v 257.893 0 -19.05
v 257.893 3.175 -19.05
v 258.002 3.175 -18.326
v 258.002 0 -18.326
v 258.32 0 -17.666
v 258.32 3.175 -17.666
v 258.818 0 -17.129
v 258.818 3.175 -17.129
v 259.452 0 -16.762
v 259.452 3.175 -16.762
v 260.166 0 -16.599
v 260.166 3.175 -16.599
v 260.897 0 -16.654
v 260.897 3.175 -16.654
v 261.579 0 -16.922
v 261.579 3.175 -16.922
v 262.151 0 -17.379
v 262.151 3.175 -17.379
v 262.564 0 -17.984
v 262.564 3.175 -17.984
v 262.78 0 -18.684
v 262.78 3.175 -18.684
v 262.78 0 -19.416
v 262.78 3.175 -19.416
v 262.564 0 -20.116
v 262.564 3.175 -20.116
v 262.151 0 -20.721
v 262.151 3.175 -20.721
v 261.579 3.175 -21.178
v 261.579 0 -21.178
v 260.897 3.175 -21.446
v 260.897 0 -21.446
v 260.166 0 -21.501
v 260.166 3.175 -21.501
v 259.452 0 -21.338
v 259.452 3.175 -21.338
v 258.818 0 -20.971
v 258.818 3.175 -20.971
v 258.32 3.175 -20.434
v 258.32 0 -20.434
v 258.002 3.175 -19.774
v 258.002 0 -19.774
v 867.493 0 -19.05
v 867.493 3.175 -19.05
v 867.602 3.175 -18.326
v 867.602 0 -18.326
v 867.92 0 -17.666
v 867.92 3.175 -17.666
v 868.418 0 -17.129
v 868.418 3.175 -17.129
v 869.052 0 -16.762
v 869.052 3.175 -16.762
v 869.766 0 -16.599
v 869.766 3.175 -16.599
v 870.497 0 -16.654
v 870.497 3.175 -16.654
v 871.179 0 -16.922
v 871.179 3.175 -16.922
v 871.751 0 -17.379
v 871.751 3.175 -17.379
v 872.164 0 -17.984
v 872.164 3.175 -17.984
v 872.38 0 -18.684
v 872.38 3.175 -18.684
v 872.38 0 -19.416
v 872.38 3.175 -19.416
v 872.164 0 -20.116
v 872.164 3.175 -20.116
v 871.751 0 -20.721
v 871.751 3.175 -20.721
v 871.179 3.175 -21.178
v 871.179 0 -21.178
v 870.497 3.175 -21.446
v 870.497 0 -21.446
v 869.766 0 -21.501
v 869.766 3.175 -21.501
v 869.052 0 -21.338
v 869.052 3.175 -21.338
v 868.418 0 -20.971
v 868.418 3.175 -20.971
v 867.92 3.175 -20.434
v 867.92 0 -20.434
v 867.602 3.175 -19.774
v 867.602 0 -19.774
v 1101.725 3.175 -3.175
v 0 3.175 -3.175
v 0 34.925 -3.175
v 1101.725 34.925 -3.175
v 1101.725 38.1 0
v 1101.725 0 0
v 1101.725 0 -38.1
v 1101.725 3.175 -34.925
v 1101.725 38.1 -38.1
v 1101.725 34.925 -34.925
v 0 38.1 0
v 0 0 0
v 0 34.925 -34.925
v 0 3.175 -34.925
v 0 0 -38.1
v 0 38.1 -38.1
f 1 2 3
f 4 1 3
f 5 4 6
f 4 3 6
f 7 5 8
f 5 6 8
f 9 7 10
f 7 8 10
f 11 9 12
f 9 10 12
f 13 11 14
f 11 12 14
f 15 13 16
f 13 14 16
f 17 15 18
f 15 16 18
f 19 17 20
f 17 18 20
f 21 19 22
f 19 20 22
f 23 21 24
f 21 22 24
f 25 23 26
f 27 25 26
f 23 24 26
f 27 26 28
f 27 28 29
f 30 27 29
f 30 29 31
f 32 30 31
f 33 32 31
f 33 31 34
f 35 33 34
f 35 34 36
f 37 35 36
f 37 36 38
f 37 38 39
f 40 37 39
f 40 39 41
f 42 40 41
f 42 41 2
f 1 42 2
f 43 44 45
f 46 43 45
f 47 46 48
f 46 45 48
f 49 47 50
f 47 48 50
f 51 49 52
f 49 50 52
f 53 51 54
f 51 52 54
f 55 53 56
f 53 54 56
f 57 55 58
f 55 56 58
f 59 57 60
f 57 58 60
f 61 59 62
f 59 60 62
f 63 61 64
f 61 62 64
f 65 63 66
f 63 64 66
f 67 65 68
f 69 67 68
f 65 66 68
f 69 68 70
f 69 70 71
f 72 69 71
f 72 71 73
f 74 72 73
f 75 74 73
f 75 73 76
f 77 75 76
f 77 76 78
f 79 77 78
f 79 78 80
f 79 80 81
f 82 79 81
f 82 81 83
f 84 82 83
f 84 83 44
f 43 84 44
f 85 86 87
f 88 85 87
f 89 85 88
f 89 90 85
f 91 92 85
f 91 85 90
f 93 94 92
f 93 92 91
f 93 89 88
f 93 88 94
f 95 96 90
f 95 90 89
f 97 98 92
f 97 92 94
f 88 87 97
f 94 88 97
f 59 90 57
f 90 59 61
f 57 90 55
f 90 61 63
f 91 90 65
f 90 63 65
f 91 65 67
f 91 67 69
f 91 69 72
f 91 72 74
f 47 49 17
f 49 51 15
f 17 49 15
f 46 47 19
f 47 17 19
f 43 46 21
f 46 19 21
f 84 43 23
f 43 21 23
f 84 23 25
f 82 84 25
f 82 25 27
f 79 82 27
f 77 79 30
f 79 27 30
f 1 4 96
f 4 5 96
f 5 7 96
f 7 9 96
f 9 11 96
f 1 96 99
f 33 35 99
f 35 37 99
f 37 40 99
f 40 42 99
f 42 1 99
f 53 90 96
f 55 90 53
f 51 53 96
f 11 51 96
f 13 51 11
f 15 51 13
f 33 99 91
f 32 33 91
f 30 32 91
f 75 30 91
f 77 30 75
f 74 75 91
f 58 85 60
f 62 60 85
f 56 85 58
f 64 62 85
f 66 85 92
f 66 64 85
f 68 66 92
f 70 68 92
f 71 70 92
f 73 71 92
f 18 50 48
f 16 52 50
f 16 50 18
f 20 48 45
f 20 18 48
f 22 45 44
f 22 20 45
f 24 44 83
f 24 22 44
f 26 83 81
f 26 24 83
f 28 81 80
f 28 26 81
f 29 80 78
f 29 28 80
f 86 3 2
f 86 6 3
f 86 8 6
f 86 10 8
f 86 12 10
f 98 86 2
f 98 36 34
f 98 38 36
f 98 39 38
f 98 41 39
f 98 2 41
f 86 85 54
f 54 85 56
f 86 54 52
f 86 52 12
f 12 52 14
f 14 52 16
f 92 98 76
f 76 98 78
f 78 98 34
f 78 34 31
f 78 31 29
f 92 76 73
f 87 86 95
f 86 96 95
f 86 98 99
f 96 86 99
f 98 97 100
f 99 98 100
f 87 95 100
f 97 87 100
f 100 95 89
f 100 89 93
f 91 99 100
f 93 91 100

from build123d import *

# Parameters (mm, degrees)
SKETCH1_W                        = 38.1
SKETCH1_H                        = 38.1
SKETCH1_W_2                      = 31.75
SKETCH1_H_2                      = 31.75
BOSS_EXTRUDE1_DEPTH              = 1101.725
F_10_0_1935_DIAMETER_HOLE1_D     = 4.9149
F_10_0_1935_DIAMETER_HOLE1_DEPTH = 3.175


with BuildPart() as part:
    # Sketch1 → Boss-Extrude1 (new body)
    with BuildSketch(Plane(origin=(0, 0, 0), x_dir=(0, 0, -1), z_dir=(1, 0, 0))):
        with Locations((19.05, 19.05)):
            Rectangle(SKETCH1_W, SKETCH1_H)
        with Locations((19.05, 19.05)):
            Rectangle(SKETCH1_W_2, SKETCH1_H_2, mode=Mode.SUBTRACT)
    extrude(amount=BOSS_EXTRUDE1_DEPTH)

    # #10 (0.1935) Diameter Hole1
    with Locations(Plane.XZ):
        with Locations((260.35, -19.05), (869.95, -19.05)):
            Hole(F_10_0_1935_DIAMETER_HOLE1_D / 2, depth=F_10_0_1935_DIAMETER_HOLE1_DEPTH)


solid = part.part
